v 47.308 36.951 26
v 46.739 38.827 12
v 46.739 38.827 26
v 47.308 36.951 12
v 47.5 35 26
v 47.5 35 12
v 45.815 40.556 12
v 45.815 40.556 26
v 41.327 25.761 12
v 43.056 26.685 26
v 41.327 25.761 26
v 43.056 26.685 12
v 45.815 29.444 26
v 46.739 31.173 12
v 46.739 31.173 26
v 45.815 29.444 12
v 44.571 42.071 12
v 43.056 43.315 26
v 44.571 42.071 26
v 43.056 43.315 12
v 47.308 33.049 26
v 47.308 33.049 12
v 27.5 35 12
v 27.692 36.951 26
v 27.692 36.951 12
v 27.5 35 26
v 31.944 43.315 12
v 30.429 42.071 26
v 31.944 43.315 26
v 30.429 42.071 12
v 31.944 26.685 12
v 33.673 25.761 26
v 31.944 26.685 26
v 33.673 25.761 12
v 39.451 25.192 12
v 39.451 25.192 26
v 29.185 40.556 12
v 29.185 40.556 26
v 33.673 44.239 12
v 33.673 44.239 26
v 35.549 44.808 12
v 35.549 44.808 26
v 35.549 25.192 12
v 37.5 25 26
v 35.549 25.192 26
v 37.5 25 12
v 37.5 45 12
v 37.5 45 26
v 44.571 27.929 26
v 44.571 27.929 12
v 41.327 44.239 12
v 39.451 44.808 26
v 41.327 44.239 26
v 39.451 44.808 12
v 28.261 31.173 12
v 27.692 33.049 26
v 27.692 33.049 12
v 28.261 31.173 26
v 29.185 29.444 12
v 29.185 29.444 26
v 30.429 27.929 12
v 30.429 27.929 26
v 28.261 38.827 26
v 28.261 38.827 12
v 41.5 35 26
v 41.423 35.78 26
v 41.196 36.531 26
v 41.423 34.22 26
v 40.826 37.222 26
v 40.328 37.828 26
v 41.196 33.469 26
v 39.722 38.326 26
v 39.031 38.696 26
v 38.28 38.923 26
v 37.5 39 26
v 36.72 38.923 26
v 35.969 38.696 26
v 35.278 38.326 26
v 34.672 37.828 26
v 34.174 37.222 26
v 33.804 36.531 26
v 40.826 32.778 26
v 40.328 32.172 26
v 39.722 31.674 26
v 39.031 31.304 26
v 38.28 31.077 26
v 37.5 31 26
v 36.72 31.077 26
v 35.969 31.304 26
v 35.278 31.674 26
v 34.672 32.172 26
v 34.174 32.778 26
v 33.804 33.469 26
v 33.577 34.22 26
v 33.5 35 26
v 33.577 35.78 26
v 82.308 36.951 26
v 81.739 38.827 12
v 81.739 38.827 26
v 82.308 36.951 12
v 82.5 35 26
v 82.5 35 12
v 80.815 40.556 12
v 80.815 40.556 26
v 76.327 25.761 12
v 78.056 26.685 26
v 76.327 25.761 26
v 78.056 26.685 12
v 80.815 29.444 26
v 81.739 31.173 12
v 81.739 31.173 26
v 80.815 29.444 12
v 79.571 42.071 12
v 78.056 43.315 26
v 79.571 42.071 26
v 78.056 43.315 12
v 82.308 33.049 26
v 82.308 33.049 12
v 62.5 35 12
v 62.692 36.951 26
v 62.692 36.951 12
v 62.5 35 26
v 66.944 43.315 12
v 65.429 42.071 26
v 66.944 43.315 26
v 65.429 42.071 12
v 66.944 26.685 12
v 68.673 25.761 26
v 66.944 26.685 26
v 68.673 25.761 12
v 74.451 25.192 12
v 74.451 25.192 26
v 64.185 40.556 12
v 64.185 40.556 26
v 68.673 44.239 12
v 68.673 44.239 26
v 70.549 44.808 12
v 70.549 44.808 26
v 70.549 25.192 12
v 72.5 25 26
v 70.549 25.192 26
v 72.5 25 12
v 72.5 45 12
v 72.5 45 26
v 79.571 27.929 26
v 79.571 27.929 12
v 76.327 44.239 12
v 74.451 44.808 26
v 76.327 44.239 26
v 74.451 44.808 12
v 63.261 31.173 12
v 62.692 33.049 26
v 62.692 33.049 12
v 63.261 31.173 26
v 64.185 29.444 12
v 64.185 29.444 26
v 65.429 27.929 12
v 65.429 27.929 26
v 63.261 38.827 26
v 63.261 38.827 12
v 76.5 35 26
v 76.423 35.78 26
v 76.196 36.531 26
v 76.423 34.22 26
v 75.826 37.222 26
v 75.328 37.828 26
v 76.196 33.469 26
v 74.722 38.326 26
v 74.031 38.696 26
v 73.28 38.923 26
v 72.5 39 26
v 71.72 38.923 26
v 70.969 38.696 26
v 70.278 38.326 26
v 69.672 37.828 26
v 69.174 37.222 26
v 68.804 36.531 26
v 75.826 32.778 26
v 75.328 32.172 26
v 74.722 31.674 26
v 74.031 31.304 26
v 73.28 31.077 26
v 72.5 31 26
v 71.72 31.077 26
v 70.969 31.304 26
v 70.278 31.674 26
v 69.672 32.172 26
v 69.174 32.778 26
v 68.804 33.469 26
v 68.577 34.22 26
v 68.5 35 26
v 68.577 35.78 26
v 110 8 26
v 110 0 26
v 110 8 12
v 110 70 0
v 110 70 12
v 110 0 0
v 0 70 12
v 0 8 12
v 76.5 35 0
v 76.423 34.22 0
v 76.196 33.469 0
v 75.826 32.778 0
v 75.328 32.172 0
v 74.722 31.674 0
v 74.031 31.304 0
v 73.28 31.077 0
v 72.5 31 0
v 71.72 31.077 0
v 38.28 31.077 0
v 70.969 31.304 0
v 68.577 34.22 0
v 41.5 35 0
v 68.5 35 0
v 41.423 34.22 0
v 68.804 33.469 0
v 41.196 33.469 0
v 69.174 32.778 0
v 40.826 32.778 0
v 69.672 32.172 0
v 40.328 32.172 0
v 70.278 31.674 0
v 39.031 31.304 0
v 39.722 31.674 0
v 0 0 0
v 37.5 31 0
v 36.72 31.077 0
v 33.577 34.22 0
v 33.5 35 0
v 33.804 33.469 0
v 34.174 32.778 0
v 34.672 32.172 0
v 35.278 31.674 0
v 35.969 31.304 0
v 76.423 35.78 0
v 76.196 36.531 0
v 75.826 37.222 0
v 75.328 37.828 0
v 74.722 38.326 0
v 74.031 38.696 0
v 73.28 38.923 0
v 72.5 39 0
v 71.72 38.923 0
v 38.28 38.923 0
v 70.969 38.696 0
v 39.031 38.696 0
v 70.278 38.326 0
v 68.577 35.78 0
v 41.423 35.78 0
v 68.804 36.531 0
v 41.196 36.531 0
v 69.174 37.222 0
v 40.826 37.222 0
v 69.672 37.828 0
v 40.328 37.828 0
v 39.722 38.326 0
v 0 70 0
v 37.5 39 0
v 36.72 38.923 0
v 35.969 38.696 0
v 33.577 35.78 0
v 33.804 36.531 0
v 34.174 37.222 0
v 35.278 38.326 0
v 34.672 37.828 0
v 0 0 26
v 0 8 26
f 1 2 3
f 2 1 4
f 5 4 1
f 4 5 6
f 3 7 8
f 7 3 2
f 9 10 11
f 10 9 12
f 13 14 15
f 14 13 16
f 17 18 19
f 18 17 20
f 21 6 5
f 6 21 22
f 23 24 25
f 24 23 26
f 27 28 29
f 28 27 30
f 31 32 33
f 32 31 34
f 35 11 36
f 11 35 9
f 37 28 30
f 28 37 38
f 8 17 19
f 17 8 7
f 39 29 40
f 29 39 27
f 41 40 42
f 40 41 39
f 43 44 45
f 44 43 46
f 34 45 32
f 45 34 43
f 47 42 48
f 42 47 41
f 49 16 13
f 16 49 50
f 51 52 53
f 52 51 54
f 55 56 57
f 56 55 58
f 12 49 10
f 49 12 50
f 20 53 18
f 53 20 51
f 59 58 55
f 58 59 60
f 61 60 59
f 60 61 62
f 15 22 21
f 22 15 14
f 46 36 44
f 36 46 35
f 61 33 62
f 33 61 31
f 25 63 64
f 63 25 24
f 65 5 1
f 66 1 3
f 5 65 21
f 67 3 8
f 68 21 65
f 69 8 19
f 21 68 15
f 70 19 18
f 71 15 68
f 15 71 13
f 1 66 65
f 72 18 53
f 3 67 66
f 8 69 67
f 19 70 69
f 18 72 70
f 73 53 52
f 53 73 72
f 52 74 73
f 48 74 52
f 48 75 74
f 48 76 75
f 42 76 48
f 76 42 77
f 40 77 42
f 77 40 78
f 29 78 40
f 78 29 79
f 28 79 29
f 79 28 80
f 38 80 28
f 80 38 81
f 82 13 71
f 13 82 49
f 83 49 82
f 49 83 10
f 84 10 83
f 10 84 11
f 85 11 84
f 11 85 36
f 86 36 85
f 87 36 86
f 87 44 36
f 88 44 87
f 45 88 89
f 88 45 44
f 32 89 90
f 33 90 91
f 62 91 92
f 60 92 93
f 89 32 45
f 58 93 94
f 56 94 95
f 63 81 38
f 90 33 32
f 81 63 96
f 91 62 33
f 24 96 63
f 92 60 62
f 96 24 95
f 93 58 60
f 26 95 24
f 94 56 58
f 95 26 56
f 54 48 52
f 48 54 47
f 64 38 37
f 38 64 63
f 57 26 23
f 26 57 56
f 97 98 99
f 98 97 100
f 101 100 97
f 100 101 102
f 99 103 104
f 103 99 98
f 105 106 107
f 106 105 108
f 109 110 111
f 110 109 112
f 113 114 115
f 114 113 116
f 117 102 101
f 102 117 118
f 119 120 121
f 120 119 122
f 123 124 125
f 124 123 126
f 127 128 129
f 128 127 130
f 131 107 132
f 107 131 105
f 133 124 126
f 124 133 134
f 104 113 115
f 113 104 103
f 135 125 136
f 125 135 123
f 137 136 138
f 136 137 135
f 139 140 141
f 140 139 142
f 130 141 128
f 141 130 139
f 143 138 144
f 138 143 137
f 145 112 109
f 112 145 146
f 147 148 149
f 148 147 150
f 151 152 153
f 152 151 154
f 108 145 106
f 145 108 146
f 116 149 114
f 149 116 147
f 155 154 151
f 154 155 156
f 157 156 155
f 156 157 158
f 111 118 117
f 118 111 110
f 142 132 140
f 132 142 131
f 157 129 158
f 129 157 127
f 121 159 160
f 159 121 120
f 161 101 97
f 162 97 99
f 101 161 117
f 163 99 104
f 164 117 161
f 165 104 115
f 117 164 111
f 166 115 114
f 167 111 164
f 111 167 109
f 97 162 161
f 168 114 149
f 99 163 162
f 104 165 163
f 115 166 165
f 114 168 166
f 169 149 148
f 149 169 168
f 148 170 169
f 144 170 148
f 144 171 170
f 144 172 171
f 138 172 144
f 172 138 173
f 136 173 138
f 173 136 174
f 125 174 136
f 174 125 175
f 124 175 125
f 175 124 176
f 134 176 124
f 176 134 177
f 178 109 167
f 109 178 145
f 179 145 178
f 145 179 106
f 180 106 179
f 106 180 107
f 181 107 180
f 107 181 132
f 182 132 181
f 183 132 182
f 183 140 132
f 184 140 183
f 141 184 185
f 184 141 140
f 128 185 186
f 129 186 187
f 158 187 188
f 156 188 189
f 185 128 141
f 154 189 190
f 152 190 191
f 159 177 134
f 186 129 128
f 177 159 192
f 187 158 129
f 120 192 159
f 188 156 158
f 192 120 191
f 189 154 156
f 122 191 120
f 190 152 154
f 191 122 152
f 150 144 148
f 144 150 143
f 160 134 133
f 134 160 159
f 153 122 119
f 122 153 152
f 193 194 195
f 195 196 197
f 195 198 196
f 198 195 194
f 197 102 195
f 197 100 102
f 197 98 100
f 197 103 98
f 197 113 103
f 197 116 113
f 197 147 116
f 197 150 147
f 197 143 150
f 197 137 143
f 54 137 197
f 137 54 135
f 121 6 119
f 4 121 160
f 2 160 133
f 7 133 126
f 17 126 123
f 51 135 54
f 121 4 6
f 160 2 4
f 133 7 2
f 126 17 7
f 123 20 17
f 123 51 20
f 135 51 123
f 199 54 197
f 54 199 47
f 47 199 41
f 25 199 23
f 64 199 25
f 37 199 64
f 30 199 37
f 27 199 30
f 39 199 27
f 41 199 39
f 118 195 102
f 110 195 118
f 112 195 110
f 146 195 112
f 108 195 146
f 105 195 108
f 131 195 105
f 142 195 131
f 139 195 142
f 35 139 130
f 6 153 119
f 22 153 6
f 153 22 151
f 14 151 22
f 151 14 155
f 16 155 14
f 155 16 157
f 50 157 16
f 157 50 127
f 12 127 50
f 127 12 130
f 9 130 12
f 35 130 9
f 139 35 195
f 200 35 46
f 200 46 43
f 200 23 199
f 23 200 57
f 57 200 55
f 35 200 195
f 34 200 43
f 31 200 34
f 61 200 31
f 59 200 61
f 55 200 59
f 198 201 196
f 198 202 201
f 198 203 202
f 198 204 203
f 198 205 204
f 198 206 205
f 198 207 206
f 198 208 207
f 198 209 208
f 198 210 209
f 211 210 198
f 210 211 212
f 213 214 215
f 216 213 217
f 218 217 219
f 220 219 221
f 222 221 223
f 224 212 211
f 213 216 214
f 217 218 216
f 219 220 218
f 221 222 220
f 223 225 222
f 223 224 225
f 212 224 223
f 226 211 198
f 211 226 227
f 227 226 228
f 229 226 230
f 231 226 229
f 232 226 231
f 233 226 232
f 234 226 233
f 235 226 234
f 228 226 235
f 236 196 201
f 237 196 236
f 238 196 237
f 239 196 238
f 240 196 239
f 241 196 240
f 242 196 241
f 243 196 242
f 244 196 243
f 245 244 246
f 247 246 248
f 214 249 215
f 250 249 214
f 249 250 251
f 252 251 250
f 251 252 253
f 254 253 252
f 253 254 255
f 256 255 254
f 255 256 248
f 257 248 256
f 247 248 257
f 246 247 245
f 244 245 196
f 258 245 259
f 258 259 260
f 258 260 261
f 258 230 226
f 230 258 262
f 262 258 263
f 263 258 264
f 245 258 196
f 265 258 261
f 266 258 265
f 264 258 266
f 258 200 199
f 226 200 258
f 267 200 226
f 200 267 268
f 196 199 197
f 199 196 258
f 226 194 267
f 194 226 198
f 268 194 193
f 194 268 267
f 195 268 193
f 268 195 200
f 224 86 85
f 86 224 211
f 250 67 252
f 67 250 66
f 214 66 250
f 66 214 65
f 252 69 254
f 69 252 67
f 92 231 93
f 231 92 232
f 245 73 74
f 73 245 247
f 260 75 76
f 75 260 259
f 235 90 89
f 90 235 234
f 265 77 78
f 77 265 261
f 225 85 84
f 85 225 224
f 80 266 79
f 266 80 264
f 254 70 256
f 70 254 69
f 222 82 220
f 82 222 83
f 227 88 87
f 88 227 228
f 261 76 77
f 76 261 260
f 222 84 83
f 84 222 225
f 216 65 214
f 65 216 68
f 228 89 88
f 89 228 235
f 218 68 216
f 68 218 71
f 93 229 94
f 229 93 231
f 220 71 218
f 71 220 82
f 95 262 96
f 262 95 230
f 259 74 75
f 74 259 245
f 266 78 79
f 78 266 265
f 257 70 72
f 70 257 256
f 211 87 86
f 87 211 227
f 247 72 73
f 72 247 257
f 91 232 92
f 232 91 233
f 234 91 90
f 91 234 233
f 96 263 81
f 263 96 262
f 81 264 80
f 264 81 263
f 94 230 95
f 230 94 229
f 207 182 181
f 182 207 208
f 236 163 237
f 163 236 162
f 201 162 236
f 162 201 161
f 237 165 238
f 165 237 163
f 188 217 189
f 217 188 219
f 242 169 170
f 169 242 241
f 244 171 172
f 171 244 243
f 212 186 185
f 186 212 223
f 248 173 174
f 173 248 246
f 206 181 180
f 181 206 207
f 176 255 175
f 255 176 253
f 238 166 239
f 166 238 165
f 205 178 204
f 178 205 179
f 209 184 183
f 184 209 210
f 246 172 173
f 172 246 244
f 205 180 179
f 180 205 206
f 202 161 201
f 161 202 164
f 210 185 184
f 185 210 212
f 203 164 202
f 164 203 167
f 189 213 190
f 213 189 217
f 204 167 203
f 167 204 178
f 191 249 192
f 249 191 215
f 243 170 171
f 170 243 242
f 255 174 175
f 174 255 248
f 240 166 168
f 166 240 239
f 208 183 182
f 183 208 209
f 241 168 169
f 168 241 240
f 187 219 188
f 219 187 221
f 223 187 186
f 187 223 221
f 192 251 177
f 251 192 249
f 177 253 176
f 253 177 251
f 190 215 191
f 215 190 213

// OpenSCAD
$fn = 32;

// ----------------------------------------------------------------------
// Drill jig: fence jig
// ----------------------------------------------------------------------

// --- parameters (mm) ---
plate_l = 110;            // plate length, X
plate_w = 70;             // plate width, Y
plate_t = 12;             // plate thickness
boss_d = 20;              // guide boss diameter
boss_h = 15;              // boss height above the plate
guide_d = 8;              // guide hole diameter
boss_pitch = 35;          // boss pitch
fence_h = 15;             // fence height above the plate
fence_t = 8;              // fence thickness
fit_tol = 0.1;            // tolerance for press fits, mm
free_tol = 0.5;           // tolerance for clearance fits, mm

n_boss = 2;  // guide bosses
boss_x0 = (plate_l - (n_boss - 1) * boss_pitch) / 2;  // first boss X
boss_top = plate_t - 1 + boss_h;  // boss crown height
fence_top = plate_t - 1 + fence_h;  // fence crown height
total_h = max([fence_top, boss_top]);  // overall height

difference() {
  union() {
  cube([plate_l, plate_w, plate_t]);
  for (i = [0 : n_boss - 1])
    translate([boss_x0 + i * boss_pitch, plate_w / 2, plate_t - 1])
      cylinder(h = boss_h, d = boss_d);
  translate([0, 0, plate_t - 1]) cube([plate_l, fence_t, fence_h]);
  }
  for (i = [0 : n_boss - 1])
    translate([boss_x0 + i * boss_pitch, plate_w / 2, -1])
      cylinder(h = plate_t + boss_h, d = guide_d);
}
